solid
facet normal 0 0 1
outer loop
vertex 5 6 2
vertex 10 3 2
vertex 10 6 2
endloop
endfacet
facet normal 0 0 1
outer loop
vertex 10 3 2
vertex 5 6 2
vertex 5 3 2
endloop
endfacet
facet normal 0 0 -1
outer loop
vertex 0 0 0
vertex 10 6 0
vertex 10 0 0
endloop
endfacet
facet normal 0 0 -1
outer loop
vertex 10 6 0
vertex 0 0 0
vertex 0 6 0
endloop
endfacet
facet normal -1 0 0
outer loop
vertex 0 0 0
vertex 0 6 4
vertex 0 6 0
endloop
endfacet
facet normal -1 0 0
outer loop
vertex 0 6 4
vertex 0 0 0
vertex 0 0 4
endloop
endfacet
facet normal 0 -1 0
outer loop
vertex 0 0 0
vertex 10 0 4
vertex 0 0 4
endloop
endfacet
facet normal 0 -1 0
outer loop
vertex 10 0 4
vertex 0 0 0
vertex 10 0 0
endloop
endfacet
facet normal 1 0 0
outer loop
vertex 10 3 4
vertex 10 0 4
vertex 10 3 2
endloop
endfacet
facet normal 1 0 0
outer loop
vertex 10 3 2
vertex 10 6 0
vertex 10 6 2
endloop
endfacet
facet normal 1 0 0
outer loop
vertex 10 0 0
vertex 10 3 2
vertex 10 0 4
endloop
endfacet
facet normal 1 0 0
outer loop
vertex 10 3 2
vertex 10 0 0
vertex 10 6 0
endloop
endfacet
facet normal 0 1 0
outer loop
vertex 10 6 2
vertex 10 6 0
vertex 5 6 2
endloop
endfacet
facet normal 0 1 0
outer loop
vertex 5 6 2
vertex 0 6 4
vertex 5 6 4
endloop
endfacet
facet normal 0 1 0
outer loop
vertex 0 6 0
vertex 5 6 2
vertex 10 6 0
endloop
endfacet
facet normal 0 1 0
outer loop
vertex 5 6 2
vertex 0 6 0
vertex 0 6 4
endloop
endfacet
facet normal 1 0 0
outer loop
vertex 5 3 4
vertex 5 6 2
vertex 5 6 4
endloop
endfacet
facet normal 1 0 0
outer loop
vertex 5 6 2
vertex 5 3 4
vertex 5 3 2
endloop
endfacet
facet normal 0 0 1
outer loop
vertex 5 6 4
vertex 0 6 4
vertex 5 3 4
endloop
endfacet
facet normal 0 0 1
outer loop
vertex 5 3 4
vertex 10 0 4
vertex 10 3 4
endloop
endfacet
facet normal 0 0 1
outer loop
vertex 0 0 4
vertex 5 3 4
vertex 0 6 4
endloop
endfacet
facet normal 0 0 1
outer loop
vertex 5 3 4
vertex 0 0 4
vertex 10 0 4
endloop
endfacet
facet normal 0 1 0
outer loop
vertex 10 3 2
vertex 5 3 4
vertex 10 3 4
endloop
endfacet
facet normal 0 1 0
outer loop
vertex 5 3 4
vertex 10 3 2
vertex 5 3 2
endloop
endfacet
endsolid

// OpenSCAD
translate([2.5, 1.5, 1.0]) color([0.8159130965336595, 0.1006075202160962, 0.14635848891230385]) cube([5, 3, 2], center=true);
translate([7.5, 1.5, 1.0]) color([0.6976706401912388, 0.04523406786561235, 0.5738660367891669]) cube([5, 3, 2], center=true);
translate([2.5, 4.5, 1.0]) color([0.9100160146990397, 0.534197968260724, 0.6805891325622565]) cube([5, 3, 2], center=true);
translate([7.5, 4.5, 1.0]) color([0.026696794662205203, 0.6349999099114583, 0.6063384177542189]) cube([5, 3, 2], center=true);
translate([2.5, 1.5, 3.0]) color([0.5759529480315407, 0.3912094093228269, 0.3701399403351875]) cube([5, 3, 2], center=true);
translate([7.5, 1.5, 3.0]) color([0.9805166506472687, 0.036392037611485795, 0.021636509855024078]) cube([5, 3, 2], center=true);
translate([2.5, 4.5, 3.0]) color([0.9610312802396112, 0.18497194139743833, 0.12389516442443171]) cube([5, 3, 2], center=true);
